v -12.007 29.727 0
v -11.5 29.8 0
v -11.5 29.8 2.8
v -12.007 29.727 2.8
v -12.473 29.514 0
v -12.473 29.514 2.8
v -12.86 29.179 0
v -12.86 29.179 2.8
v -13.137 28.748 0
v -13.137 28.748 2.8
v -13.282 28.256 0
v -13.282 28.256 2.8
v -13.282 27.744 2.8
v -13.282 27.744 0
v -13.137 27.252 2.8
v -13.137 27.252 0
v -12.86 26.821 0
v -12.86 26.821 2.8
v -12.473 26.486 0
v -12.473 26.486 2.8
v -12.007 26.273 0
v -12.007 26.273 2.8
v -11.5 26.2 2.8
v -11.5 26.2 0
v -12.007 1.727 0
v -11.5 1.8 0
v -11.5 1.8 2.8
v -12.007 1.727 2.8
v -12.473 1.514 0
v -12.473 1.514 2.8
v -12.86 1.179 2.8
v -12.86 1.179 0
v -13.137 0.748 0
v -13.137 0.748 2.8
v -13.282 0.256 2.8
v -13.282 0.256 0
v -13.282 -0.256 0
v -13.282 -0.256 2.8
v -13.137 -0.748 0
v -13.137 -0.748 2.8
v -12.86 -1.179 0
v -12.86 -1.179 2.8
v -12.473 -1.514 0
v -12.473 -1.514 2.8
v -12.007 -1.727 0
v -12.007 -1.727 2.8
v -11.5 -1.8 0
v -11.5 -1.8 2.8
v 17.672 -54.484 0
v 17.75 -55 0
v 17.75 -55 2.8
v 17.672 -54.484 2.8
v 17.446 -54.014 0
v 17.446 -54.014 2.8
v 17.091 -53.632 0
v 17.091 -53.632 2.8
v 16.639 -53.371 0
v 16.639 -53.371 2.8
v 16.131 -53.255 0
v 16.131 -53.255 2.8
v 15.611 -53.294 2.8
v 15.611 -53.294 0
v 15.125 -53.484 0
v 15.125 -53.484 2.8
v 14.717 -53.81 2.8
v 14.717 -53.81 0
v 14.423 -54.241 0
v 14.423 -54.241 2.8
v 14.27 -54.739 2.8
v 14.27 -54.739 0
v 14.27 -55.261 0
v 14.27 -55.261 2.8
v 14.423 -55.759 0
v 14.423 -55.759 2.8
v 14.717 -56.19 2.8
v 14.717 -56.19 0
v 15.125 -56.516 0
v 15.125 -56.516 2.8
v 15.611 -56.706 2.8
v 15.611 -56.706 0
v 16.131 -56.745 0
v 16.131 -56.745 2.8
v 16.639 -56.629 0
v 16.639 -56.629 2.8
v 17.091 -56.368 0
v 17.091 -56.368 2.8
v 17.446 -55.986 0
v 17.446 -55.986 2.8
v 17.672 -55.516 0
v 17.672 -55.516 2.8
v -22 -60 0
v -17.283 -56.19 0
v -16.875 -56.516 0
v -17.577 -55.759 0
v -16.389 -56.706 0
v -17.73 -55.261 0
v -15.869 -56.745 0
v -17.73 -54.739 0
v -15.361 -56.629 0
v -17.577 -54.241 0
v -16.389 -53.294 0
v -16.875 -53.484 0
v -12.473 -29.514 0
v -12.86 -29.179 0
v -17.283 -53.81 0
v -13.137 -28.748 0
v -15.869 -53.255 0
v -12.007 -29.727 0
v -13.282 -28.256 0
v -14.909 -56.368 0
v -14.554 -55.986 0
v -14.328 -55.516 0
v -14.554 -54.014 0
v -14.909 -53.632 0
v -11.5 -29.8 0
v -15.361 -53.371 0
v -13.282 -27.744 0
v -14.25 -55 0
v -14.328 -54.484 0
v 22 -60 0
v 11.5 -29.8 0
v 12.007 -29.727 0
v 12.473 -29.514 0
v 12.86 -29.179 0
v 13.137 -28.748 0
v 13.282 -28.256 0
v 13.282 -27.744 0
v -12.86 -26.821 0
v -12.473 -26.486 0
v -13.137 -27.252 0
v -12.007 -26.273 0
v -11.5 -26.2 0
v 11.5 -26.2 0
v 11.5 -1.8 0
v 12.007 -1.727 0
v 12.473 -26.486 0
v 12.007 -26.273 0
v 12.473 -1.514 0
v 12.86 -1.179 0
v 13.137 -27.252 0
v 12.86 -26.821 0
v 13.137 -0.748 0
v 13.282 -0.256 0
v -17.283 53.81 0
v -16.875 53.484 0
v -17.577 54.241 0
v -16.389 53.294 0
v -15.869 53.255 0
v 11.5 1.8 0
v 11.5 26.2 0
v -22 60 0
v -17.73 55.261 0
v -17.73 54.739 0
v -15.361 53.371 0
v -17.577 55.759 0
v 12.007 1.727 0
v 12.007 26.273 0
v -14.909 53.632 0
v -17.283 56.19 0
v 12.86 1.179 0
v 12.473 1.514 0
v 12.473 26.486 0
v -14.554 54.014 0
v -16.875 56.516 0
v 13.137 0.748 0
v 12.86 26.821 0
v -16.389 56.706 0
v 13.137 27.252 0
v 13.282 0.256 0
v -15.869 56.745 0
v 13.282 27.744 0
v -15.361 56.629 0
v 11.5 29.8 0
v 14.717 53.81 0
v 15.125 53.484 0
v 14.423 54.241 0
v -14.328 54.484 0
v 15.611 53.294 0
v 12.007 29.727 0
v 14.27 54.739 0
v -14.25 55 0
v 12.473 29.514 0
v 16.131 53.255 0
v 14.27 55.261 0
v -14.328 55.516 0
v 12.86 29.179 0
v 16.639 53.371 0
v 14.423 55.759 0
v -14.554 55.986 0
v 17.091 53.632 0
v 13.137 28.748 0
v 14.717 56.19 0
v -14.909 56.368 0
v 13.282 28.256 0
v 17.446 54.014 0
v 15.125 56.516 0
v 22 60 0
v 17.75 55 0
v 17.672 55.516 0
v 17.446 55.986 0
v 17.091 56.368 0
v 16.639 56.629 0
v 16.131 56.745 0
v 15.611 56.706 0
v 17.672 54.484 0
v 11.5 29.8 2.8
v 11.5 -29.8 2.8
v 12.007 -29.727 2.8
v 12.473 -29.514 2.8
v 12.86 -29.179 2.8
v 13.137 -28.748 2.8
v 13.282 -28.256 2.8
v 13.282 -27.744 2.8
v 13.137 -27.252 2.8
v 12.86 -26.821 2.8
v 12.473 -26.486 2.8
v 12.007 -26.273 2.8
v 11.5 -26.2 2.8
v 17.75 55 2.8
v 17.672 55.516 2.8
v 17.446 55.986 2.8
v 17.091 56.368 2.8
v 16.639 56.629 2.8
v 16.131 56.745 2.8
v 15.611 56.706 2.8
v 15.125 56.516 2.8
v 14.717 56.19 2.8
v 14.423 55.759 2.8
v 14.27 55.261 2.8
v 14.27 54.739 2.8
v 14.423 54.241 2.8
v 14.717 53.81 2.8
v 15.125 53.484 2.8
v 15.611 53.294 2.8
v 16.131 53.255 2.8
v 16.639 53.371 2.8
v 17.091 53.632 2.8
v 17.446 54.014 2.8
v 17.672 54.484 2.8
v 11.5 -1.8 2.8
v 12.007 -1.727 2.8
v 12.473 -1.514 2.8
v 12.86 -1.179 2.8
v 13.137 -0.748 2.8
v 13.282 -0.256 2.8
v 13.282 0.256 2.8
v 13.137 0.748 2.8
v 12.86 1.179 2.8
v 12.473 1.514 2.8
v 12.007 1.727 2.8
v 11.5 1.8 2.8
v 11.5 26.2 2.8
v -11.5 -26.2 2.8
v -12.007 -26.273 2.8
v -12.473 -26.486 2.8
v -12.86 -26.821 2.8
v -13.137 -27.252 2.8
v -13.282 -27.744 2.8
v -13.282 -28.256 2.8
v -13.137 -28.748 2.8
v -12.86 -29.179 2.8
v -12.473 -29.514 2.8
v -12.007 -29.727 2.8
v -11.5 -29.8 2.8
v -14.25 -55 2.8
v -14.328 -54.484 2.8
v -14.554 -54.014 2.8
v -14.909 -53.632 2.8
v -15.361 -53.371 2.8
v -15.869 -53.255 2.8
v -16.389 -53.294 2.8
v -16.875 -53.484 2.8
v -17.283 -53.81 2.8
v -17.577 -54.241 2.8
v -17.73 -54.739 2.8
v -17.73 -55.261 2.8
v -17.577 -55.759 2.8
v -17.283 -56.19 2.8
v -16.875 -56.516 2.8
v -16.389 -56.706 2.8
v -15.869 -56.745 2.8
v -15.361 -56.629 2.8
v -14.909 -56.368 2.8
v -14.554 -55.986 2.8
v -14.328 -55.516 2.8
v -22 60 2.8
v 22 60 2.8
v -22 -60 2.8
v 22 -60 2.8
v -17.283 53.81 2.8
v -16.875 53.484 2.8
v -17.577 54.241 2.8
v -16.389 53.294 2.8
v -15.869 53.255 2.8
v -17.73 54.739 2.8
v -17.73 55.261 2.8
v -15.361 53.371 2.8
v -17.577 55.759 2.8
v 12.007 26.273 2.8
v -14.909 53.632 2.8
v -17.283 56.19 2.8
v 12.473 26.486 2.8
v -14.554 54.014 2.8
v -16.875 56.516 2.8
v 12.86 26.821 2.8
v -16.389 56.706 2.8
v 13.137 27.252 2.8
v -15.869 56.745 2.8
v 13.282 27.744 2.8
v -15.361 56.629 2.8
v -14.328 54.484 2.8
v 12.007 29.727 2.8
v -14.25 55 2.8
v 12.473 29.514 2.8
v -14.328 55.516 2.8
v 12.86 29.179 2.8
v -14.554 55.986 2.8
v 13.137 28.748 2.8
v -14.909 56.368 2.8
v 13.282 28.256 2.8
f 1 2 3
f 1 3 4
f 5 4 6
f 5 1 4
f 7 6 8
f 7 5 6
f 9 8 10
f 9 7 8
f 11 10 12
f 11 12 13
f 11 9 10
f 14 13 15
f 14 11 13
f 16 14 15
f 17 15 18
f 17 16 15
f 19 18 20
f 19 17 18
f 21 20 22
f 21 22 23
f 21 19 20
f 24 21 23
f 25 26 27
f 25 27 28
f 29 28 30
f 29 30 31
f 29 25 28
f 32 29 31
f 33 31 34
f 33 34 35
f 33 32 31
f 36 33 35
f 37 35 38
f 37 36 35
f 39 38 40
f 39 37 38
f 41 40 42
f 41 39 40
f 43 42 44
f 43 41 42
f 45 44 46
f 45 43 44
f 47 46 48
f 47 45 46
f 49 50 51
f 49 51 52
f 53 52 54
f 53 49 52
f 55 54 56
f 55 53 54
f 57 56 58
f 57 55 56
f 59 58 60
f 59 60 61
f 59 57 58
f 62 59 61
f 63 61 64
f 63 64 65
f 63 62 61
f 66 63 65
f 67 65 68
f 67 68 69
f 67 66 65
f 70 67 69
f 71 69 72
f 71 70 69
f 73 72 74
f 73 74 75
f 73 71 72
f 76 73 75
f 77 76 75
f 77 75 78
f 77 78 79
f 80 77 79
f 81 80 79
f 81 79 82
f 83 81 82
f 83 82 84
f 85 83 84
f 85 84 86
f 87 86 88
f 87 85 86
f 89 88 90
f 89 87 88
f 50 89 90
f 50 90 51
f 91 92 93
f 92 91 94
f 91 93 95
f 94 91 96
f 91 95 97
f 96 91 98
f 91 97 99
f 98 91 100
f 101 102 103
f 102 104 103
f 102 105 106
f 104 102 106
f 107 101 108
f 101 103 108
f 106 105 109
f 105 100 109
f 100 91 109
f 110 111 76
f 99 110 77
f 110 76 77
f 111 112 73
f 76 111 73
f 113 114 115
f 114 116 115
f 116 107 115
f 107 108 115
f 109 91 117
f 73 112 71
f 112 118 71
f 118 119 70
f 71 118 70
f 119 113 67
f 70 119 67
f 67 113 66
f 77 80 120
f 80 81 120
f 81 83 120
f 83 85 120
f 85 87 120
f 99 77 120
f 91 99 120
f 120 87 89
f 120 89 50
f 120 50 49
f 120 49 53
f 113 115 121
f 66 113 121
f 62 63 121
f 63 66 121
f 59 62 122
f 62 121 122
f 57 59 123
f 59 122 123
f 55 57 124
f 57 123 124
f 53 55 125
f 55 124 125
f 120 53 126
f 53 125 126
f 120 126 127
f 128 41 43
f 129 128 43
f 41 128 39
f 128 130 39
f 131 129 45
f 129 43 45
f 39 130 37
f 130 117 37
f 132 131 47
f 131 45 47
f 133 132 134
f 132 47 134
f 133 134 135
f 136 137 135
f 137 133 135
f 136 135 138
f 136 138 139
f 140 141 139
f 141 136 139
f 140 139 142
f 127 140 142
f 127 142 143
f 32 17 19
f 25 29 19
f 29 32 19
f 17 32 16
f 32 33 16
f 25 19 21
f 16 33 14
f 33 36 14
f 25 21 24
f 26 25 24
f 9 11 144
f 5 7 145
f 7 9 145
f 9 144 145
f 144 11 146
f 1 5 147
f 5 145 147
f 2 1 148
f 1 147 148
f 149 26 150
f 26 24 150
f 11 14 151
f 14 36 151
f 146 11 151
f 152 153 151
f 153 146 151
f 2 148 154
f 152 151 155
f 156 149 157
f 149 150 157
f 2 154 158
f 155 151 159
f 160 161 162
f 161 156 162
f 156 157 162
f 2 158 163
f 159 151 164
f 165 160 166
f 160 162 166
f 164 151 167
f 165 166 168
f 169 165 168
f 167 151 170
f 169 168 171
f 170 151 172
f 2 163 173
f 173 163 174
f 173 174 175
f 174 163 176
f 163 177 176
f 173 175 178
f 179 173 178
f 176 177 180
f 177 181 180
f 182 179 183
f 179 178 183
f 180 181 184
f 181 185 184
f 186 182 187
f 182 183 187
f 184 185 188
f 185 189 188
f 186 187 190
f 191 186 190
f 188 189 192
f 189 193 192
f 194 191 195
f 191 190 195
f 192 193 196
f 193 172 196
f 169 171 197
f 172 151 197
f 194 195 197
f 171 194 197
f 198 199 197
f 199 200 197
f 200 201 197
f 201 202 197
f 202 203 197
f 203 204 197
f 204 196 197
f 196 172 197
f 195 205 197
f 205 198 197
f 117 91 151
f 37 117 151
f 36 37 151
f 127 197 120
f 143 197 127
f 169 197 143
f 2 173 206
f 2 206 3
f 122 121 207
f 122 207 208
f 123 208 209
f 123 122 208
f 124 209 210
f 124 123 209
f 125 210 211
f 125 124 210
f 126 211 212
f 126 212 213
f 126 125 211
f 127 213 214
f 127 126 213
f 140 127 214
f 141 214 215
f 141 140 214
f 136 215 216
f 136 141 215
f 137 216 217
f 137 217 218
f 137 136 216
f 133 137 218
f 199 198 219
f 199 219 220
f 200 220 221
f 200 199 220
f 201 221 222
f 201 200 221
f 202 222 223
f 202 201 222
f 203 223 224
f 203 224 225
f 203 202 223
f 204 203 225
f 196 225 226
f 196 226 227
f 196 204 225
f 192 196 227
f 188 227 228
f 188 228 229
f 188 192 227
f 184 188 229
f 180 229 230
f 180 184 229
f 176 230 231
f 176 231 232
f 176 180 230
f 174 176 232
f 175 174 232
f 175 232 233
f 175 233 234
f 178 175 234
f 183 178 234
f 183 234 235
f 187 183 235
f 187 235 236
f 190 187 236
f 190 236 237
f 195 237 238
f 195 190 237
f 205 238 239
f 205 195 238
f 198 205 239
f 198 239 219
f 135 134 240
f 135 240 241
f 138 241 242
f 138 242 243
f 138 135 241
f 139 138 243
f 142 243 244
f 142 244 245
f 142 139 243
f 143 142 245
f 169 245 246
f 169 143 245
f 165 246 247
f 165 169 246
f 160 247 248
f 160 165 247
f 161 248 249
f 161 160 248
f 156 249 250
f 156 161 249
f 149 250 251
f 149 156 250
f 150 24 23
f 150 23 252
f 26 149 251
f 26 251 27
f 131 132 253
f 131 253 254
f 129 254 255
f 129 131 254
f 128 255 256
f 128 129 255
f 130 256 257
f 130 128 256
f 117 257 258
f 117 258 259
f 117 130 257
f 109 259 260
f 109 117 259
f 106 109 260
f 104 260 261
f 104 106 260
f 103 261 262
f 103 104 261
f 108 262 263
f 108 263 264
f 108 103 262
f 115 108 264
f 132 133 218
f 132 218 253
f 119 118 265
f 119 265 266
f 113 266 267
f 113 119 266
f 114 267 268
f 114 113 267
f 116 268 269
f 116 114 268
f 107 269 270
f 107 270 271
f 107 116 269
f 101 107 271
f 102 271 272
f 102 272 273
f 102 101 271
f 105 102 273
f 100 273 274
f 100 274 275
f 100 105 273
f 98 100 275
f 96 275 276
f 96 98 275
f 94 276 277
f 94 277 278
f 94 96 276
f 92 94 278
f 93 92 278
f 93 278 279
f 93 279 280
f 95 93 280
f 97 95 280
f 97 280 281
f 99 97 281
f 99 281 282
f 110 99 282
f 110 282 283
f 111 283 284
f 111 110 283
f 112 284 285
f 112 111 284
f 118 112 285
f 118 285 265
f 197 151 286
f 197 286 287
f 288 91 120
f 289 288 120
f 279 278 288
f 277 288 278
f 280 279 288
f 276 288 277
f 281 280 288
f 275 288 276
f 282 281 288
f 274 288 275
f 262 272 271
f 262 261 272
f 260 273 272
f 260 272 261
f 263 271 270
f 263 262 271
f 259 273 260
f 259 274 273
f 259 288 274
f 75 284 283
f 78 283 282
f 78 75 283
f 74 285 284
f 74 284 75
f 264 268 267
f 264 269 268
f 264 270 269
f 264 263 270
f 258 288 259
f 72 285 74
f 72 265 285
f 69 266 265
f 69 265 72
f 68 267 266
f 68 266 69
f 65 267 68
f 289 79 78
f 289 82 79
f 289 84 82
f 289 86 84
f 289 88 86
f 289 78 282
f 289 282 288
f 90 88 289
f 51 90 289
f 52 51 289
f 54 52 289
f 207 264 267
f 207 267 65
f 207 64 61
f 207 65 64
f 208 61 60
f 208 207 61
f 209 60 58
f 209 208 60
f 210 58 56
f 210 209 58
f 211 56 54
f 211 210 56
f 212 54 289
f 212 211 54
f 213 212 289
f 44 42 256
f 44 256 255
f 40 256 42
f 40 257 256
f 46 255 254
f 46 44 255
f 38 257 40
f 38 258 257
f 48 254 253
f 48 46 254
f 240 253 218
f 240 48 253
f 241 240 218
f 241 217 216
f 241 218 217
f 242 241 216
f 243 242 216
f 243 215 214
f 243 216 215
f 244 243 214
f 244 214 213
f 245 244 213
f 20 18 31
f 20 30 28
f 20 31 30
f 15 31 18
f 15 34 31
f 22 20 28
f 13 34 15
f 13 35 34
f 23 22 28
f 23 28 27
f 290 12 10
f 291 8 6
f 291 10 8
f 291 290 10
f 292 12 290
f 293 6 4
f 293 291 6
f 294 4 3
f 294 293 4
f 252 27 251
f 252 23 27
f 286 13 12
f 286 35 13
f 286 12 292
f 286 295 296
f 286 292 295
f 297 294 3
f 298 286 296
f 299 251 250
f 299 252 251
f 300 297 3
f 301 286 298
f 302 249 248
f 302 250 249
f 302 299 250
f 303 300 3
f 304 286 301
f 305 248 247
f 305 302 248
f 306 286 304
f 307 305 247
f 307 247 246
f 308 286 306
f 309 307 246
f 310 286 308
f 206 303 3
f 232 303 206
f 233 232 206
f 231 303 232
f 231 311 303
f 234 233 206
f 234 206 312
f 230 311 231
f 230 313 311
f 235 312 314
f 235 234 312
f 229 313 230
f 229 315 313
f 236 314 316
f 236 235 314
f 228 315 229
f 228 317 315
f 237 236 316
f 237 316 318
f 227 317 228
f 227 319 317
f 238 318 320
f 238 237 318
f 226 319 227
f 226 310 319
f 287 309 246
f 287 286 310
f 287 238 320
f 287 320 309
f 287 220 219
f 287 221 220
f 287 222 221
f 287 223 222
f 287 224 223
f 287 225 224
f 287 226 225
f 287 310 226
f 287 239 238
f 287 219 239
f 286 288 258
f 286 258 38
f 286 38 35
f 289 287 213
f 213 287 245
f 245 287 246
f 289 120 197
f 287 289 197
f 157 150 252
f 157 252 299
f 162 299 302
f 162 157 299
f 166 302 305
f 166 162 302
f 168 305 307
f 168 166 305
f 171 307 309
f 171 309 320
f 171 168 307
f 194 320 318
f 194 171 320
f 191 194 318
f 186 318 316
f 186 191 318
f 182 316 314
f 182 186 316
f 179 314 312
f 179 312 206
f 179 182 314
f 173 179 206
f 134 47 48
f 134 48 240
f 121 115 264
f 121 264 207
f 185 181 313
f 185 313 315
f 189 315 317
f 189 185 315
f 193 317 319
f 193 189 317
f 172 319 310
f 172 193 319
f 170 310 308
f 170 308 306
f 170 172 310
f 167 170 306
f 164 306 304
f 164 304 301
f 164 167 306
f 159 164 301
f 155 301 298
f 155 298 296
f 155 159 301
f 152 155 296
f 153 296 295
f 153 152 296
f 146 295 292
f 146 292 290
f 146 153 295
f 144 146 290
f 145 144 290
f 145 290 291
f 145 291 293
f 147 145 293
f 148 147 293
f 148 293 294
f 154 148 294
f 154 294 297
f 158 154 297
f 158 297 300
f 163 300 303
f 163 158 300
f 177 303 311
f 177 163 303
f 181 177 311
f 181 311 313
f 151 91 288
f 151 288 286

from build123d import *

# Parameters (mm, degrees)
PACK_ACCESS_WITH_STRAP_VENTILATION_PROFI_W = 44
PACK_ACCESS_WITH_STRAP_VENTILATION_PROFI_H = 120
PACK_ACCESS_WITH_STRAP_VENTILATION_PROFI_R = 1.75
PACK_ACCESS_WITH_STRAP_VENTILATION_DEPTH   = 2.8


with BuildPart() as part:
    # Pack access with strap ventilation profile → Pack access with strap ventilation (new body)
    with BuildSketch(Plane.XY):
        Rectangle(PACK_ACCESS_WITH_STRAP_VENTILATION_PROFI_W, PACK_ACCESS_WITH_STRAP_VENTILATION_PROFI_H)
        with Locations((-16, -55)):
            Circle(PACK_ACCESS_WITH_STRAP_VENTILATION_PROFI_R, mode=Mode.SUBTRACT)
        with Locations((-16, 55)):
            Circle(PACK_ACCESS_WITH_STRAP_VENTILATION_PROFI_R, mode=Mode.SUBTRACT)
        with Locations((16, -55)):
            Circle(PACK_ACCESS_WITH_STRAP_VENTILATION_PROFI_R, mode=Mode.SUBTRACT)
        with Locations((16, 55)):
            Circle(PACK_ACCESS_WITH_STRAP_VENTILATION_PROFI_R, mode=Mode.SUBTRACT)
        with BuildLine():
            Line((-11.5, -29.8), (11.5, -29.8))
            ThreePointArc((11.5, -29.8), (13.3, -28), (11.5, -26.2))
            Line((11.5, -26.2), (-11.5, -26.2))
            ThreePointArc((-11.5, -26.2), (-13.3, -28), (-11.5, -29.8))
        make_face(mode=Mode.SUBTRACT)
        with BuildLine():
            Line((-11.5, -1.8), (11.5, -1.8))
            ThreePointArc((11.5, -1.8), (13.3, 0), (11.5, 1.8))
            Line((11.5, 1.8), (-11.5, 1.8))
            ThreePointArc((-11.5, 1.8), (-13.3, 0), (-11.5, -1.8))
        make_face(mode=Mode.SUBTRACT)
        with BuildLine():
            Line((-11.5, 26.2), (11.5, 26.2))
            ThreePointArc((11.5, 26.2), (13.3, 28), (11.5, 29.8))
            Line((11.5, 29.8), (-11.5, 29.8))
            ThreePointArc((-11.5, 29.8), (-13.3, 28), (-11.5, 26.2))
        make_face(mode=Mode.SUBTRACT)
    extrude(amount=PACK_ACCESS_WITH_STRAP_VENTILATION_DEPTH)


solid = part.part
